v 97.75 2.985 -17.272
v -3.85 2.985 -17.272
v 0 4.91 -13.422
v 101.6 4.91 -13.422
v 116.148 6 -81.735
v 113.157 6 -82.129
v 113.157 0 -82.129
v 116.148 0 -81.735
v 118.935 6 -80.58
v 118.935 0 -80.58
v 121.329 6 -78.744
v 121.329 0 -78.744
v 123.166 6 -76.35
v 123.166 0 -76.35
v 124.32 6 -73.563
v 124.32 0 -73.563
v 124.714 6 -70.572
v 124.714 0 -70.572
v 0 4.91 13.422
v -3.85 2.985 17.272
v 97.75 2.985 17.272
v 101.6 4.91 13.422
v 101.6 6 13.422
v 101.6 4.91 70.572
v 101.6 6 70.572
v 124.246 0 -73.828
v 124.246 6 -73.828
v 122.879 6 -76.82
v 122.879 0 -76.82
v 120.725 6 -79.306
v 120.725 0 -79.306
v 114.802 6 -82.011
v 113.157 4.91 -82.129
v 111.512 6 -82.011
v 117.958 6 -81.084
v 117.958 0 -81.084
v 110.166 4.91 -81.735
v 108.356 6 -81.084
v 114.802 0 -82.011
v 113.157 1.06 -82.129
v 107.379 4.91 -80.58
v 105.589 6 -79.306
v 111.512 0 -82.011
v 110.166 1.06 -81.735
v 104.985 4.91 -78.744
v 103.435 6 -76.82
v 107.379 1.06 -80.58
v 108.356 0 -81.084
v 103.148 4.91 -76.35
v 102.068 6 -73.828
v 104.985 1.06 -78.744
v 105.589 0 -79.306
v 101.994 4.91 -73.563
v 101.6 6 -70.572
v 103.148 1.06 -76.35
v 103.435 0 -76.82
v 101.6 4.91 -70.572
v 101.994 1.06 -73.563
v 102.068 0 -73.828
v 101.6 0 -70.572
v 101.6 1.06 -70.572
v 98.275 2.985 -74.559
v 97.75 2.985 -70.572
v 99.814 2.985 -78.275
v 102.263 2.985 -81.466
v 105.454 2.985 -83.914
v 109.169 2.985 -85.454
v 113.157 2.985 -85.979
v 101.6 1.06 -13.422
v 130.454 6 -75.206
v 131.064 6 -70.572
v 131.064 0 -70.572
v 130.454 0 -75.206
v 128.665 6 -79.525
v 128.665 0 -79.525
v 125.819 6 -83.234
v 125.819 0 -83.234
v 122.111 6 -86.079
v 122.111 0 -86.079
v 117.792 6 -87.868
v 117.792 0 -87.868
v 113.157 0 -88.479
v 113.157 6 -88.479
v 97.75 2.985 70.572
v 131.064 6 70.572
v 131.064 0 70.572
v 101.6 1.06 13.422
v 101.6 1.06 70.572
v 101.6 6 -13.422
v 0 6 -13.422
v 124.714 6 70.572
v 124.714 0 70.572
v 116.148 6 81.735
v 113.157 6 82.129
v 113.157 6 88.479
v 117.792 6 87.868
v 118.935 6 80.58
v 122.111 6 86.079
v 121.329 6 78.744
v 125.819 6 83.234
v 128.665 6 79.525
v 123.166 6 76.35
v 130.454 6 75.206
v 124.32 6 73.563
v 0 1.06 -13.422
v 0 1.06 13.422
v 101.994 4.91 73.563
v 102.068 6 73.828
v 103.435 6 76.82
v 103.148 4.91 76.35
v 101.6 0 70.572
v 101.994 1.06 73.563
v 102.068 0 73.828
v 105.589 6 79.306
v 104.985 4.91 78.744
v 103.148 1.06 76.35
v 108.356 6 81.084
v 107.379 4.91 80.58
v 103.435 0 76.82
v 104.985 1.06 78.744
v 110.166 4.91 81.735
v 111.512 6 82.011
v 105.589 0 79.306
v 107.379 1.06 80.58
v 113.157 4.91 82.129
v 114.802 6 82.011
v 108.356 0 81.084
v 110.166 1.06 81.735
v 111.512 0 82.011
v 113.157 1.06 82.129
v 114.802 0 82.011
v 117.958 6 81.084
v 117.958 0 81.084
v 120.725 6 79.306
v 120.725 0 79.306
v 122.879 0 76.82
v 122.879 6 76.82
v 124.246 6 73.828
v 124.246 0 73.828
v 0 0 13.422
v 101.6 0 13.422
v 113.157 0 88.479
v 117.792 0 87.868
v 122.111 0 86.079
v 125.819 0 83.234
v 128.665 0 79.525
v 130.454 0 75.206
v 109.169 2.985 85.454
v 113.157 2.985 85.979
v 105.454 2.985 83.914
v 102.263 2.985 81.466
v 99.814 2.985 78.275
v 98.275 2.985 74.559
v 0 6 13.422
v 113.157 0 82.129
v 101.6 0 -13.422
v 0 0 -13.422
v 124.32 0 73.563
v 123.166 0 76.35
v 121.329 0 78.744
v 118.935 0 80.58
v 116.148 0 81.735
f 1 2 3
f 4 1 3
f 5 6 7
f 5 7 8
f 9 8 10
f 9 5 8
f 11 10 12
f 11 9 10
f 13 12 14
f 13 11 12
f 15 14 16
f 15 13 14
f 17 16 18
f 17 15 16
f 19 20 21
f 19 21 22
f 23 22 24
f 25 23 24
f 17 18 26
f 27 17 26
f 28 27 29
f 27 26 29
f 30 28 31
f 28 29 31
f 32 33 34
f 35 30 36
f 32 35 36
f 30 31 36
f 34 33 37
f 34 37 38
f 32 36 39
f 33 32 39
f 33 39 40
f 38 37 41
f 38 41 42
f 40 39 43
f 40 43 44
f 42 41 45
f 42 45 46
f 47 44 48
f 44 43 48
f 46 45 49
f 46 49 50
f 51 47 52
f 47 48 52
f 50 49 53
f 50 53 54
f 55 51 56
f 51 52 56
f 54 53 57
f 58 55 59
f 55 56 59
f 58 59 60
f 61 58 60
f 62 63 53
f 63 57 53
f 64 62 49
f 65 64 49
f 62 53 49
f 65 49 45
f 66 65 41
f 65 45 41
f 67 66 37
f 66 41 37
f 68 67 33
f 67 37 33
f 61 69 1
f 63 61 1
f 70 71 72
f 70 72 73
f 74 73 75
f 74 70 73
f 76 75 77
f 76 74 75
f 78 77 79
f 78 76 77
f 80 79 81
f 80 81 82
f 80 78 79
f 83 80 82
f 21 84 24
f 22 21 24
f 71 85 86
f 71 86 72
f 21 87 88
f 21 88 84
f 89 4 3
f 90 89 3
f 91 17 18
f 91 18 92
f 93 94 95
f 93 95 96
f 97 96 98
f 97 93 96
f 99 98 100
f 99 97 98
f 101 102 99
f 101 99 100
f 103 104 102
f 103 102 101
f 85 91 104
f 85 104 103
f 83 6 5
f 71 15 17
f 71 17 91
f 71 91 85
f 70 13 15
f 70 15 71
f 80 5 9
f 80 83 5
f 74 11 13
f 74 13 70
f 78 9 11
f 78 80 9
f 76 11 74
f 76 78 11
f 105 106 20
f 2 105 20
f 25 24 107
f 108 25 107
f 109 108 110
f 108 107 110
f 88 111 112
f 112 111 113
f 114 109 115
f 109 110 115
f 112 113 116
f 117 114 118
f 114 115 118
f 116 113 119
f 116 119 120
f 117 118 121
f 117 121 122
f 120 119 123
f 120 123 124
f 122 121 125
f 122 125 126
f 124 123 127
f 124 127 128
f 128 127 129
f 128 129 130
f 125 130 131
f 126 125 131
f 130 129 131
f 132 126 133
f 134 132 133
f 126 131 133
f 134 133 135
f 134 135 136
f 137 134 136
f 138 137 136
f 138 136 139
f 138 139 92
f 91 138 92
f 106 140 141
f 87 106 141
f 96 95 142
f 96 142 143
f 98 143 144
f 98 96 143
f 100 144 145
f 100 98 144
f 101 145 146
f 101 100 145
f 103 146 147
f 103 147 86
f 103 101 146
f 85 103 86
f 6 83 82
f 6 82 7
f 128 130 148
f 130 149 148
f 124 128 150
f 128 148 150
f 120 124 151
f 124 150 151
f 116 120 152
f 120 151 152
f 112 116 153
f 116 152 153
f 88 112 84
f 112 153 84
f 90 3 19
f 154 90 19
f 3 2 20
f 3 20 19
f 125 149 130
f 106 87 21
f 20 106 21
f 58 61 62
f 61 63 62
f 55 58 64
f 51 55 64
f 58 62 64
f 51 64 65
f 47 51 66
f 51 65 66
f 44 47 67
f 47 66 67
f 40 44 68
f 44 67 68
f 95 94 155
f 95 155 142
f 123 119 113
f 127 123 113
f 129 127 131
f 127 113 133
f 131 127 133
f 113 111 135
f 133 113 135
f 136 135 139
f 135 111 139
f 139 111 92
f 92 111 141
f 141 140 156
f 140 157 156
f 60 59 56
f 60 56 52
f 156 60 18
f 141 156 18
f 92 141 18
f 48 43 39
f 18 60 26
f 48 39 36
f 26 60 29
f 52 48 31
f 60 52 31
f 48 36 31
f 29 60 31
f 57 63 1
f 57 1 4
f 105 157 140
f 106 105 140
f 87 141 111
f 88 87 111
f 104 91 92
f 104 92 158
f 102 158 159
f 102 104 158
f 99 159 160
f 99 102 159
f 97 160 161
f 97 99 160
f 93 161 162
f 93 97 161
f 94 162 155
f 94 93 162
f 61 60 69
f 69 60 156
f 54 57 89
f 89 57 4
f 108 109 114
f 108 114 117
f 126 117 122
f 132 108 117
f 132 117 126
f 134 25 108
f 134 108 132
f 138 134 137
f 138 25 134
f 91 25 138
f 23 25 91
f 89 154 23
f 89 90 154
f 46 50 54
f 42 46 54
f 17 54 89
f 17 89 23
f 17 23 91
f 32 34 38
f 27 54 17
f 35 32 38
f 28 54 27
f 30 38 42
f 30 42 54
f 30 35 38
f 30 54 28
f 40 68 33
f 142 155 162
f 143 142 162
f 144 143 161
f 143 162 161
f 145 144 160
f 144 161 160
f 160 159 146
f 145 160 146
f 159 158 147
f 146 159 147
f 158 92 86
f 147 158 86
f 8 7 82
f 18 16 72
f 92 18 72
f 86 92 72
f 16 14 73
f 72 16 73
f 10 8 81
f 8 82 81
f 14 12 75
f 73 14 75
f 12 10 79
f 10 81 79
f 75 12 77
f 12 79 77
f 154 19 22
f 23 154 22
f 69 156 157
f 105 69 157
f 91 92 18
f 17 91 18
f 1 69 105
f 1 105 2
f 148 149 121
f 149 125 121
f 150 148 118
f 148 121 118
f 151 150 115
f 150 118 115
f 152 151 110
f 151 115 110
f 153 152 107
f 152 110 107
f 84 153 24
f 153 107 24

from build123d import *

# Parameters (mm, degrees)
BOSS_EXTRUDE1_DEPTH = 6
BOSS_EXTRUDE2_DEPTH = 6


with BuildPart() as part:
    # Sketch1 → Boss-Extrude1 (new body)
    with BuildSketch(Plane(origin=(0, 0, 0), x_dir=(1, 0, 0), z_dir=(0, 1, 0))):
        with BuildLine():
            Line((0, -13.421553628), (101.6, -13.421553628))
            Line((101.6, -13.421553628), (101.6, -70.571553628))
            ThreePointArc((101.6, -70.571553628), (113.157, -82.128553628), (124.714, -70.571553628))
            Line((124.714, -70.571553628), (124.714, 70.571553628))
            ThreePointArc((124.714, 70.571553628), (113.157, 82.128553628), (101.6, 70.571553628))
            Line((101.6, 70.571553628), (101.6, 13.421553628))
            Line((101.6, 13.421553628), (0, 13.421553628))
            Line((0, 13.421553628), (0, -13.421553628))
        make_face()
    extrude(amount=BOSS_EXTRUDE1_DEPTH)

    # Sweep1: sweep along a curve in space
    with BuildLine() as sweep1_path:
        ThreePointArc((113.157, 3, 82.128553628), (104.98496693, 3, 78.743586698), (101.6, 3, 70.571553628))
        Line((101.6, 3, 70.571553628), (101.6, 3, 13.421553628))
        Line((101.6, 3, 13.421553628), (0, 3, 13.421553628))
        Line((0, 3, 13.421553628), (0, 3, -13.421553628))
        Line((0, 3, -13.421553628), (101.6, 3, -13.421553628))
        Line((101.6, 3, -13.421553628), (101.6, 3, -70.571553628))
        ThreePointArc((101.6, 3, -70.571553628), (104.98496693, 3, -78.743586698), (113.157, 3, -82.128553628))
    # Sketch4 → Sweep1 (sweep)
    with BuildSketch(Plane(origin=(113.157, 0, 0), x_dir=(0, 0, -1), z_dir=(1, 0, 0))):
        Polygon((82.128553628, 4.910343042), (82.128553628, 1.060343042), (85.978553628, 2.985343042), align=None)
    sweep(path=sweep1_path.line, transition=Transition.RIGHT)


with BuildPart() as body_2:
    # Sketch5 → Boss-Extrude2 (new body)
    with BuildSketch(Plane(origin=(0, 6, 0), x_dir=(1, 0, 0), z_dir=(0, 1, 0))):
        with BuildLine():
            Line((131.064, -70.571553628), (131.064, 70.571553628))
            ThreePointArc((131.064, 70.571553628), (125.819161131, 83.233714759), (113.157, 88.478553628))
            Line((113.157, 88.478553628), (113.157, 82.128553628))
            ThreePointArc((113.157, 82.128553628), (121.32903307, 78.743586698), (124.714, 70.571553628))
            Line((124.714, 70.571553628), (124.714, -70.571553628))
            ThreePointArc((124.714, -70.571553628), (121.32903307, -78.743586698), (113.157, -82.128553628))
            Line((113.157, -82.128553628), (113.157, -88.478553628))
            ThreePointArc((113.157, -88.478553628), (125.819161131, -83.233714759), (131.064, -70.571553628))
        make_face()
    extrude(amount=-BOSS_EXTRUDE2_DEPTH)


solid = Compound([part.part, body_2.part])
